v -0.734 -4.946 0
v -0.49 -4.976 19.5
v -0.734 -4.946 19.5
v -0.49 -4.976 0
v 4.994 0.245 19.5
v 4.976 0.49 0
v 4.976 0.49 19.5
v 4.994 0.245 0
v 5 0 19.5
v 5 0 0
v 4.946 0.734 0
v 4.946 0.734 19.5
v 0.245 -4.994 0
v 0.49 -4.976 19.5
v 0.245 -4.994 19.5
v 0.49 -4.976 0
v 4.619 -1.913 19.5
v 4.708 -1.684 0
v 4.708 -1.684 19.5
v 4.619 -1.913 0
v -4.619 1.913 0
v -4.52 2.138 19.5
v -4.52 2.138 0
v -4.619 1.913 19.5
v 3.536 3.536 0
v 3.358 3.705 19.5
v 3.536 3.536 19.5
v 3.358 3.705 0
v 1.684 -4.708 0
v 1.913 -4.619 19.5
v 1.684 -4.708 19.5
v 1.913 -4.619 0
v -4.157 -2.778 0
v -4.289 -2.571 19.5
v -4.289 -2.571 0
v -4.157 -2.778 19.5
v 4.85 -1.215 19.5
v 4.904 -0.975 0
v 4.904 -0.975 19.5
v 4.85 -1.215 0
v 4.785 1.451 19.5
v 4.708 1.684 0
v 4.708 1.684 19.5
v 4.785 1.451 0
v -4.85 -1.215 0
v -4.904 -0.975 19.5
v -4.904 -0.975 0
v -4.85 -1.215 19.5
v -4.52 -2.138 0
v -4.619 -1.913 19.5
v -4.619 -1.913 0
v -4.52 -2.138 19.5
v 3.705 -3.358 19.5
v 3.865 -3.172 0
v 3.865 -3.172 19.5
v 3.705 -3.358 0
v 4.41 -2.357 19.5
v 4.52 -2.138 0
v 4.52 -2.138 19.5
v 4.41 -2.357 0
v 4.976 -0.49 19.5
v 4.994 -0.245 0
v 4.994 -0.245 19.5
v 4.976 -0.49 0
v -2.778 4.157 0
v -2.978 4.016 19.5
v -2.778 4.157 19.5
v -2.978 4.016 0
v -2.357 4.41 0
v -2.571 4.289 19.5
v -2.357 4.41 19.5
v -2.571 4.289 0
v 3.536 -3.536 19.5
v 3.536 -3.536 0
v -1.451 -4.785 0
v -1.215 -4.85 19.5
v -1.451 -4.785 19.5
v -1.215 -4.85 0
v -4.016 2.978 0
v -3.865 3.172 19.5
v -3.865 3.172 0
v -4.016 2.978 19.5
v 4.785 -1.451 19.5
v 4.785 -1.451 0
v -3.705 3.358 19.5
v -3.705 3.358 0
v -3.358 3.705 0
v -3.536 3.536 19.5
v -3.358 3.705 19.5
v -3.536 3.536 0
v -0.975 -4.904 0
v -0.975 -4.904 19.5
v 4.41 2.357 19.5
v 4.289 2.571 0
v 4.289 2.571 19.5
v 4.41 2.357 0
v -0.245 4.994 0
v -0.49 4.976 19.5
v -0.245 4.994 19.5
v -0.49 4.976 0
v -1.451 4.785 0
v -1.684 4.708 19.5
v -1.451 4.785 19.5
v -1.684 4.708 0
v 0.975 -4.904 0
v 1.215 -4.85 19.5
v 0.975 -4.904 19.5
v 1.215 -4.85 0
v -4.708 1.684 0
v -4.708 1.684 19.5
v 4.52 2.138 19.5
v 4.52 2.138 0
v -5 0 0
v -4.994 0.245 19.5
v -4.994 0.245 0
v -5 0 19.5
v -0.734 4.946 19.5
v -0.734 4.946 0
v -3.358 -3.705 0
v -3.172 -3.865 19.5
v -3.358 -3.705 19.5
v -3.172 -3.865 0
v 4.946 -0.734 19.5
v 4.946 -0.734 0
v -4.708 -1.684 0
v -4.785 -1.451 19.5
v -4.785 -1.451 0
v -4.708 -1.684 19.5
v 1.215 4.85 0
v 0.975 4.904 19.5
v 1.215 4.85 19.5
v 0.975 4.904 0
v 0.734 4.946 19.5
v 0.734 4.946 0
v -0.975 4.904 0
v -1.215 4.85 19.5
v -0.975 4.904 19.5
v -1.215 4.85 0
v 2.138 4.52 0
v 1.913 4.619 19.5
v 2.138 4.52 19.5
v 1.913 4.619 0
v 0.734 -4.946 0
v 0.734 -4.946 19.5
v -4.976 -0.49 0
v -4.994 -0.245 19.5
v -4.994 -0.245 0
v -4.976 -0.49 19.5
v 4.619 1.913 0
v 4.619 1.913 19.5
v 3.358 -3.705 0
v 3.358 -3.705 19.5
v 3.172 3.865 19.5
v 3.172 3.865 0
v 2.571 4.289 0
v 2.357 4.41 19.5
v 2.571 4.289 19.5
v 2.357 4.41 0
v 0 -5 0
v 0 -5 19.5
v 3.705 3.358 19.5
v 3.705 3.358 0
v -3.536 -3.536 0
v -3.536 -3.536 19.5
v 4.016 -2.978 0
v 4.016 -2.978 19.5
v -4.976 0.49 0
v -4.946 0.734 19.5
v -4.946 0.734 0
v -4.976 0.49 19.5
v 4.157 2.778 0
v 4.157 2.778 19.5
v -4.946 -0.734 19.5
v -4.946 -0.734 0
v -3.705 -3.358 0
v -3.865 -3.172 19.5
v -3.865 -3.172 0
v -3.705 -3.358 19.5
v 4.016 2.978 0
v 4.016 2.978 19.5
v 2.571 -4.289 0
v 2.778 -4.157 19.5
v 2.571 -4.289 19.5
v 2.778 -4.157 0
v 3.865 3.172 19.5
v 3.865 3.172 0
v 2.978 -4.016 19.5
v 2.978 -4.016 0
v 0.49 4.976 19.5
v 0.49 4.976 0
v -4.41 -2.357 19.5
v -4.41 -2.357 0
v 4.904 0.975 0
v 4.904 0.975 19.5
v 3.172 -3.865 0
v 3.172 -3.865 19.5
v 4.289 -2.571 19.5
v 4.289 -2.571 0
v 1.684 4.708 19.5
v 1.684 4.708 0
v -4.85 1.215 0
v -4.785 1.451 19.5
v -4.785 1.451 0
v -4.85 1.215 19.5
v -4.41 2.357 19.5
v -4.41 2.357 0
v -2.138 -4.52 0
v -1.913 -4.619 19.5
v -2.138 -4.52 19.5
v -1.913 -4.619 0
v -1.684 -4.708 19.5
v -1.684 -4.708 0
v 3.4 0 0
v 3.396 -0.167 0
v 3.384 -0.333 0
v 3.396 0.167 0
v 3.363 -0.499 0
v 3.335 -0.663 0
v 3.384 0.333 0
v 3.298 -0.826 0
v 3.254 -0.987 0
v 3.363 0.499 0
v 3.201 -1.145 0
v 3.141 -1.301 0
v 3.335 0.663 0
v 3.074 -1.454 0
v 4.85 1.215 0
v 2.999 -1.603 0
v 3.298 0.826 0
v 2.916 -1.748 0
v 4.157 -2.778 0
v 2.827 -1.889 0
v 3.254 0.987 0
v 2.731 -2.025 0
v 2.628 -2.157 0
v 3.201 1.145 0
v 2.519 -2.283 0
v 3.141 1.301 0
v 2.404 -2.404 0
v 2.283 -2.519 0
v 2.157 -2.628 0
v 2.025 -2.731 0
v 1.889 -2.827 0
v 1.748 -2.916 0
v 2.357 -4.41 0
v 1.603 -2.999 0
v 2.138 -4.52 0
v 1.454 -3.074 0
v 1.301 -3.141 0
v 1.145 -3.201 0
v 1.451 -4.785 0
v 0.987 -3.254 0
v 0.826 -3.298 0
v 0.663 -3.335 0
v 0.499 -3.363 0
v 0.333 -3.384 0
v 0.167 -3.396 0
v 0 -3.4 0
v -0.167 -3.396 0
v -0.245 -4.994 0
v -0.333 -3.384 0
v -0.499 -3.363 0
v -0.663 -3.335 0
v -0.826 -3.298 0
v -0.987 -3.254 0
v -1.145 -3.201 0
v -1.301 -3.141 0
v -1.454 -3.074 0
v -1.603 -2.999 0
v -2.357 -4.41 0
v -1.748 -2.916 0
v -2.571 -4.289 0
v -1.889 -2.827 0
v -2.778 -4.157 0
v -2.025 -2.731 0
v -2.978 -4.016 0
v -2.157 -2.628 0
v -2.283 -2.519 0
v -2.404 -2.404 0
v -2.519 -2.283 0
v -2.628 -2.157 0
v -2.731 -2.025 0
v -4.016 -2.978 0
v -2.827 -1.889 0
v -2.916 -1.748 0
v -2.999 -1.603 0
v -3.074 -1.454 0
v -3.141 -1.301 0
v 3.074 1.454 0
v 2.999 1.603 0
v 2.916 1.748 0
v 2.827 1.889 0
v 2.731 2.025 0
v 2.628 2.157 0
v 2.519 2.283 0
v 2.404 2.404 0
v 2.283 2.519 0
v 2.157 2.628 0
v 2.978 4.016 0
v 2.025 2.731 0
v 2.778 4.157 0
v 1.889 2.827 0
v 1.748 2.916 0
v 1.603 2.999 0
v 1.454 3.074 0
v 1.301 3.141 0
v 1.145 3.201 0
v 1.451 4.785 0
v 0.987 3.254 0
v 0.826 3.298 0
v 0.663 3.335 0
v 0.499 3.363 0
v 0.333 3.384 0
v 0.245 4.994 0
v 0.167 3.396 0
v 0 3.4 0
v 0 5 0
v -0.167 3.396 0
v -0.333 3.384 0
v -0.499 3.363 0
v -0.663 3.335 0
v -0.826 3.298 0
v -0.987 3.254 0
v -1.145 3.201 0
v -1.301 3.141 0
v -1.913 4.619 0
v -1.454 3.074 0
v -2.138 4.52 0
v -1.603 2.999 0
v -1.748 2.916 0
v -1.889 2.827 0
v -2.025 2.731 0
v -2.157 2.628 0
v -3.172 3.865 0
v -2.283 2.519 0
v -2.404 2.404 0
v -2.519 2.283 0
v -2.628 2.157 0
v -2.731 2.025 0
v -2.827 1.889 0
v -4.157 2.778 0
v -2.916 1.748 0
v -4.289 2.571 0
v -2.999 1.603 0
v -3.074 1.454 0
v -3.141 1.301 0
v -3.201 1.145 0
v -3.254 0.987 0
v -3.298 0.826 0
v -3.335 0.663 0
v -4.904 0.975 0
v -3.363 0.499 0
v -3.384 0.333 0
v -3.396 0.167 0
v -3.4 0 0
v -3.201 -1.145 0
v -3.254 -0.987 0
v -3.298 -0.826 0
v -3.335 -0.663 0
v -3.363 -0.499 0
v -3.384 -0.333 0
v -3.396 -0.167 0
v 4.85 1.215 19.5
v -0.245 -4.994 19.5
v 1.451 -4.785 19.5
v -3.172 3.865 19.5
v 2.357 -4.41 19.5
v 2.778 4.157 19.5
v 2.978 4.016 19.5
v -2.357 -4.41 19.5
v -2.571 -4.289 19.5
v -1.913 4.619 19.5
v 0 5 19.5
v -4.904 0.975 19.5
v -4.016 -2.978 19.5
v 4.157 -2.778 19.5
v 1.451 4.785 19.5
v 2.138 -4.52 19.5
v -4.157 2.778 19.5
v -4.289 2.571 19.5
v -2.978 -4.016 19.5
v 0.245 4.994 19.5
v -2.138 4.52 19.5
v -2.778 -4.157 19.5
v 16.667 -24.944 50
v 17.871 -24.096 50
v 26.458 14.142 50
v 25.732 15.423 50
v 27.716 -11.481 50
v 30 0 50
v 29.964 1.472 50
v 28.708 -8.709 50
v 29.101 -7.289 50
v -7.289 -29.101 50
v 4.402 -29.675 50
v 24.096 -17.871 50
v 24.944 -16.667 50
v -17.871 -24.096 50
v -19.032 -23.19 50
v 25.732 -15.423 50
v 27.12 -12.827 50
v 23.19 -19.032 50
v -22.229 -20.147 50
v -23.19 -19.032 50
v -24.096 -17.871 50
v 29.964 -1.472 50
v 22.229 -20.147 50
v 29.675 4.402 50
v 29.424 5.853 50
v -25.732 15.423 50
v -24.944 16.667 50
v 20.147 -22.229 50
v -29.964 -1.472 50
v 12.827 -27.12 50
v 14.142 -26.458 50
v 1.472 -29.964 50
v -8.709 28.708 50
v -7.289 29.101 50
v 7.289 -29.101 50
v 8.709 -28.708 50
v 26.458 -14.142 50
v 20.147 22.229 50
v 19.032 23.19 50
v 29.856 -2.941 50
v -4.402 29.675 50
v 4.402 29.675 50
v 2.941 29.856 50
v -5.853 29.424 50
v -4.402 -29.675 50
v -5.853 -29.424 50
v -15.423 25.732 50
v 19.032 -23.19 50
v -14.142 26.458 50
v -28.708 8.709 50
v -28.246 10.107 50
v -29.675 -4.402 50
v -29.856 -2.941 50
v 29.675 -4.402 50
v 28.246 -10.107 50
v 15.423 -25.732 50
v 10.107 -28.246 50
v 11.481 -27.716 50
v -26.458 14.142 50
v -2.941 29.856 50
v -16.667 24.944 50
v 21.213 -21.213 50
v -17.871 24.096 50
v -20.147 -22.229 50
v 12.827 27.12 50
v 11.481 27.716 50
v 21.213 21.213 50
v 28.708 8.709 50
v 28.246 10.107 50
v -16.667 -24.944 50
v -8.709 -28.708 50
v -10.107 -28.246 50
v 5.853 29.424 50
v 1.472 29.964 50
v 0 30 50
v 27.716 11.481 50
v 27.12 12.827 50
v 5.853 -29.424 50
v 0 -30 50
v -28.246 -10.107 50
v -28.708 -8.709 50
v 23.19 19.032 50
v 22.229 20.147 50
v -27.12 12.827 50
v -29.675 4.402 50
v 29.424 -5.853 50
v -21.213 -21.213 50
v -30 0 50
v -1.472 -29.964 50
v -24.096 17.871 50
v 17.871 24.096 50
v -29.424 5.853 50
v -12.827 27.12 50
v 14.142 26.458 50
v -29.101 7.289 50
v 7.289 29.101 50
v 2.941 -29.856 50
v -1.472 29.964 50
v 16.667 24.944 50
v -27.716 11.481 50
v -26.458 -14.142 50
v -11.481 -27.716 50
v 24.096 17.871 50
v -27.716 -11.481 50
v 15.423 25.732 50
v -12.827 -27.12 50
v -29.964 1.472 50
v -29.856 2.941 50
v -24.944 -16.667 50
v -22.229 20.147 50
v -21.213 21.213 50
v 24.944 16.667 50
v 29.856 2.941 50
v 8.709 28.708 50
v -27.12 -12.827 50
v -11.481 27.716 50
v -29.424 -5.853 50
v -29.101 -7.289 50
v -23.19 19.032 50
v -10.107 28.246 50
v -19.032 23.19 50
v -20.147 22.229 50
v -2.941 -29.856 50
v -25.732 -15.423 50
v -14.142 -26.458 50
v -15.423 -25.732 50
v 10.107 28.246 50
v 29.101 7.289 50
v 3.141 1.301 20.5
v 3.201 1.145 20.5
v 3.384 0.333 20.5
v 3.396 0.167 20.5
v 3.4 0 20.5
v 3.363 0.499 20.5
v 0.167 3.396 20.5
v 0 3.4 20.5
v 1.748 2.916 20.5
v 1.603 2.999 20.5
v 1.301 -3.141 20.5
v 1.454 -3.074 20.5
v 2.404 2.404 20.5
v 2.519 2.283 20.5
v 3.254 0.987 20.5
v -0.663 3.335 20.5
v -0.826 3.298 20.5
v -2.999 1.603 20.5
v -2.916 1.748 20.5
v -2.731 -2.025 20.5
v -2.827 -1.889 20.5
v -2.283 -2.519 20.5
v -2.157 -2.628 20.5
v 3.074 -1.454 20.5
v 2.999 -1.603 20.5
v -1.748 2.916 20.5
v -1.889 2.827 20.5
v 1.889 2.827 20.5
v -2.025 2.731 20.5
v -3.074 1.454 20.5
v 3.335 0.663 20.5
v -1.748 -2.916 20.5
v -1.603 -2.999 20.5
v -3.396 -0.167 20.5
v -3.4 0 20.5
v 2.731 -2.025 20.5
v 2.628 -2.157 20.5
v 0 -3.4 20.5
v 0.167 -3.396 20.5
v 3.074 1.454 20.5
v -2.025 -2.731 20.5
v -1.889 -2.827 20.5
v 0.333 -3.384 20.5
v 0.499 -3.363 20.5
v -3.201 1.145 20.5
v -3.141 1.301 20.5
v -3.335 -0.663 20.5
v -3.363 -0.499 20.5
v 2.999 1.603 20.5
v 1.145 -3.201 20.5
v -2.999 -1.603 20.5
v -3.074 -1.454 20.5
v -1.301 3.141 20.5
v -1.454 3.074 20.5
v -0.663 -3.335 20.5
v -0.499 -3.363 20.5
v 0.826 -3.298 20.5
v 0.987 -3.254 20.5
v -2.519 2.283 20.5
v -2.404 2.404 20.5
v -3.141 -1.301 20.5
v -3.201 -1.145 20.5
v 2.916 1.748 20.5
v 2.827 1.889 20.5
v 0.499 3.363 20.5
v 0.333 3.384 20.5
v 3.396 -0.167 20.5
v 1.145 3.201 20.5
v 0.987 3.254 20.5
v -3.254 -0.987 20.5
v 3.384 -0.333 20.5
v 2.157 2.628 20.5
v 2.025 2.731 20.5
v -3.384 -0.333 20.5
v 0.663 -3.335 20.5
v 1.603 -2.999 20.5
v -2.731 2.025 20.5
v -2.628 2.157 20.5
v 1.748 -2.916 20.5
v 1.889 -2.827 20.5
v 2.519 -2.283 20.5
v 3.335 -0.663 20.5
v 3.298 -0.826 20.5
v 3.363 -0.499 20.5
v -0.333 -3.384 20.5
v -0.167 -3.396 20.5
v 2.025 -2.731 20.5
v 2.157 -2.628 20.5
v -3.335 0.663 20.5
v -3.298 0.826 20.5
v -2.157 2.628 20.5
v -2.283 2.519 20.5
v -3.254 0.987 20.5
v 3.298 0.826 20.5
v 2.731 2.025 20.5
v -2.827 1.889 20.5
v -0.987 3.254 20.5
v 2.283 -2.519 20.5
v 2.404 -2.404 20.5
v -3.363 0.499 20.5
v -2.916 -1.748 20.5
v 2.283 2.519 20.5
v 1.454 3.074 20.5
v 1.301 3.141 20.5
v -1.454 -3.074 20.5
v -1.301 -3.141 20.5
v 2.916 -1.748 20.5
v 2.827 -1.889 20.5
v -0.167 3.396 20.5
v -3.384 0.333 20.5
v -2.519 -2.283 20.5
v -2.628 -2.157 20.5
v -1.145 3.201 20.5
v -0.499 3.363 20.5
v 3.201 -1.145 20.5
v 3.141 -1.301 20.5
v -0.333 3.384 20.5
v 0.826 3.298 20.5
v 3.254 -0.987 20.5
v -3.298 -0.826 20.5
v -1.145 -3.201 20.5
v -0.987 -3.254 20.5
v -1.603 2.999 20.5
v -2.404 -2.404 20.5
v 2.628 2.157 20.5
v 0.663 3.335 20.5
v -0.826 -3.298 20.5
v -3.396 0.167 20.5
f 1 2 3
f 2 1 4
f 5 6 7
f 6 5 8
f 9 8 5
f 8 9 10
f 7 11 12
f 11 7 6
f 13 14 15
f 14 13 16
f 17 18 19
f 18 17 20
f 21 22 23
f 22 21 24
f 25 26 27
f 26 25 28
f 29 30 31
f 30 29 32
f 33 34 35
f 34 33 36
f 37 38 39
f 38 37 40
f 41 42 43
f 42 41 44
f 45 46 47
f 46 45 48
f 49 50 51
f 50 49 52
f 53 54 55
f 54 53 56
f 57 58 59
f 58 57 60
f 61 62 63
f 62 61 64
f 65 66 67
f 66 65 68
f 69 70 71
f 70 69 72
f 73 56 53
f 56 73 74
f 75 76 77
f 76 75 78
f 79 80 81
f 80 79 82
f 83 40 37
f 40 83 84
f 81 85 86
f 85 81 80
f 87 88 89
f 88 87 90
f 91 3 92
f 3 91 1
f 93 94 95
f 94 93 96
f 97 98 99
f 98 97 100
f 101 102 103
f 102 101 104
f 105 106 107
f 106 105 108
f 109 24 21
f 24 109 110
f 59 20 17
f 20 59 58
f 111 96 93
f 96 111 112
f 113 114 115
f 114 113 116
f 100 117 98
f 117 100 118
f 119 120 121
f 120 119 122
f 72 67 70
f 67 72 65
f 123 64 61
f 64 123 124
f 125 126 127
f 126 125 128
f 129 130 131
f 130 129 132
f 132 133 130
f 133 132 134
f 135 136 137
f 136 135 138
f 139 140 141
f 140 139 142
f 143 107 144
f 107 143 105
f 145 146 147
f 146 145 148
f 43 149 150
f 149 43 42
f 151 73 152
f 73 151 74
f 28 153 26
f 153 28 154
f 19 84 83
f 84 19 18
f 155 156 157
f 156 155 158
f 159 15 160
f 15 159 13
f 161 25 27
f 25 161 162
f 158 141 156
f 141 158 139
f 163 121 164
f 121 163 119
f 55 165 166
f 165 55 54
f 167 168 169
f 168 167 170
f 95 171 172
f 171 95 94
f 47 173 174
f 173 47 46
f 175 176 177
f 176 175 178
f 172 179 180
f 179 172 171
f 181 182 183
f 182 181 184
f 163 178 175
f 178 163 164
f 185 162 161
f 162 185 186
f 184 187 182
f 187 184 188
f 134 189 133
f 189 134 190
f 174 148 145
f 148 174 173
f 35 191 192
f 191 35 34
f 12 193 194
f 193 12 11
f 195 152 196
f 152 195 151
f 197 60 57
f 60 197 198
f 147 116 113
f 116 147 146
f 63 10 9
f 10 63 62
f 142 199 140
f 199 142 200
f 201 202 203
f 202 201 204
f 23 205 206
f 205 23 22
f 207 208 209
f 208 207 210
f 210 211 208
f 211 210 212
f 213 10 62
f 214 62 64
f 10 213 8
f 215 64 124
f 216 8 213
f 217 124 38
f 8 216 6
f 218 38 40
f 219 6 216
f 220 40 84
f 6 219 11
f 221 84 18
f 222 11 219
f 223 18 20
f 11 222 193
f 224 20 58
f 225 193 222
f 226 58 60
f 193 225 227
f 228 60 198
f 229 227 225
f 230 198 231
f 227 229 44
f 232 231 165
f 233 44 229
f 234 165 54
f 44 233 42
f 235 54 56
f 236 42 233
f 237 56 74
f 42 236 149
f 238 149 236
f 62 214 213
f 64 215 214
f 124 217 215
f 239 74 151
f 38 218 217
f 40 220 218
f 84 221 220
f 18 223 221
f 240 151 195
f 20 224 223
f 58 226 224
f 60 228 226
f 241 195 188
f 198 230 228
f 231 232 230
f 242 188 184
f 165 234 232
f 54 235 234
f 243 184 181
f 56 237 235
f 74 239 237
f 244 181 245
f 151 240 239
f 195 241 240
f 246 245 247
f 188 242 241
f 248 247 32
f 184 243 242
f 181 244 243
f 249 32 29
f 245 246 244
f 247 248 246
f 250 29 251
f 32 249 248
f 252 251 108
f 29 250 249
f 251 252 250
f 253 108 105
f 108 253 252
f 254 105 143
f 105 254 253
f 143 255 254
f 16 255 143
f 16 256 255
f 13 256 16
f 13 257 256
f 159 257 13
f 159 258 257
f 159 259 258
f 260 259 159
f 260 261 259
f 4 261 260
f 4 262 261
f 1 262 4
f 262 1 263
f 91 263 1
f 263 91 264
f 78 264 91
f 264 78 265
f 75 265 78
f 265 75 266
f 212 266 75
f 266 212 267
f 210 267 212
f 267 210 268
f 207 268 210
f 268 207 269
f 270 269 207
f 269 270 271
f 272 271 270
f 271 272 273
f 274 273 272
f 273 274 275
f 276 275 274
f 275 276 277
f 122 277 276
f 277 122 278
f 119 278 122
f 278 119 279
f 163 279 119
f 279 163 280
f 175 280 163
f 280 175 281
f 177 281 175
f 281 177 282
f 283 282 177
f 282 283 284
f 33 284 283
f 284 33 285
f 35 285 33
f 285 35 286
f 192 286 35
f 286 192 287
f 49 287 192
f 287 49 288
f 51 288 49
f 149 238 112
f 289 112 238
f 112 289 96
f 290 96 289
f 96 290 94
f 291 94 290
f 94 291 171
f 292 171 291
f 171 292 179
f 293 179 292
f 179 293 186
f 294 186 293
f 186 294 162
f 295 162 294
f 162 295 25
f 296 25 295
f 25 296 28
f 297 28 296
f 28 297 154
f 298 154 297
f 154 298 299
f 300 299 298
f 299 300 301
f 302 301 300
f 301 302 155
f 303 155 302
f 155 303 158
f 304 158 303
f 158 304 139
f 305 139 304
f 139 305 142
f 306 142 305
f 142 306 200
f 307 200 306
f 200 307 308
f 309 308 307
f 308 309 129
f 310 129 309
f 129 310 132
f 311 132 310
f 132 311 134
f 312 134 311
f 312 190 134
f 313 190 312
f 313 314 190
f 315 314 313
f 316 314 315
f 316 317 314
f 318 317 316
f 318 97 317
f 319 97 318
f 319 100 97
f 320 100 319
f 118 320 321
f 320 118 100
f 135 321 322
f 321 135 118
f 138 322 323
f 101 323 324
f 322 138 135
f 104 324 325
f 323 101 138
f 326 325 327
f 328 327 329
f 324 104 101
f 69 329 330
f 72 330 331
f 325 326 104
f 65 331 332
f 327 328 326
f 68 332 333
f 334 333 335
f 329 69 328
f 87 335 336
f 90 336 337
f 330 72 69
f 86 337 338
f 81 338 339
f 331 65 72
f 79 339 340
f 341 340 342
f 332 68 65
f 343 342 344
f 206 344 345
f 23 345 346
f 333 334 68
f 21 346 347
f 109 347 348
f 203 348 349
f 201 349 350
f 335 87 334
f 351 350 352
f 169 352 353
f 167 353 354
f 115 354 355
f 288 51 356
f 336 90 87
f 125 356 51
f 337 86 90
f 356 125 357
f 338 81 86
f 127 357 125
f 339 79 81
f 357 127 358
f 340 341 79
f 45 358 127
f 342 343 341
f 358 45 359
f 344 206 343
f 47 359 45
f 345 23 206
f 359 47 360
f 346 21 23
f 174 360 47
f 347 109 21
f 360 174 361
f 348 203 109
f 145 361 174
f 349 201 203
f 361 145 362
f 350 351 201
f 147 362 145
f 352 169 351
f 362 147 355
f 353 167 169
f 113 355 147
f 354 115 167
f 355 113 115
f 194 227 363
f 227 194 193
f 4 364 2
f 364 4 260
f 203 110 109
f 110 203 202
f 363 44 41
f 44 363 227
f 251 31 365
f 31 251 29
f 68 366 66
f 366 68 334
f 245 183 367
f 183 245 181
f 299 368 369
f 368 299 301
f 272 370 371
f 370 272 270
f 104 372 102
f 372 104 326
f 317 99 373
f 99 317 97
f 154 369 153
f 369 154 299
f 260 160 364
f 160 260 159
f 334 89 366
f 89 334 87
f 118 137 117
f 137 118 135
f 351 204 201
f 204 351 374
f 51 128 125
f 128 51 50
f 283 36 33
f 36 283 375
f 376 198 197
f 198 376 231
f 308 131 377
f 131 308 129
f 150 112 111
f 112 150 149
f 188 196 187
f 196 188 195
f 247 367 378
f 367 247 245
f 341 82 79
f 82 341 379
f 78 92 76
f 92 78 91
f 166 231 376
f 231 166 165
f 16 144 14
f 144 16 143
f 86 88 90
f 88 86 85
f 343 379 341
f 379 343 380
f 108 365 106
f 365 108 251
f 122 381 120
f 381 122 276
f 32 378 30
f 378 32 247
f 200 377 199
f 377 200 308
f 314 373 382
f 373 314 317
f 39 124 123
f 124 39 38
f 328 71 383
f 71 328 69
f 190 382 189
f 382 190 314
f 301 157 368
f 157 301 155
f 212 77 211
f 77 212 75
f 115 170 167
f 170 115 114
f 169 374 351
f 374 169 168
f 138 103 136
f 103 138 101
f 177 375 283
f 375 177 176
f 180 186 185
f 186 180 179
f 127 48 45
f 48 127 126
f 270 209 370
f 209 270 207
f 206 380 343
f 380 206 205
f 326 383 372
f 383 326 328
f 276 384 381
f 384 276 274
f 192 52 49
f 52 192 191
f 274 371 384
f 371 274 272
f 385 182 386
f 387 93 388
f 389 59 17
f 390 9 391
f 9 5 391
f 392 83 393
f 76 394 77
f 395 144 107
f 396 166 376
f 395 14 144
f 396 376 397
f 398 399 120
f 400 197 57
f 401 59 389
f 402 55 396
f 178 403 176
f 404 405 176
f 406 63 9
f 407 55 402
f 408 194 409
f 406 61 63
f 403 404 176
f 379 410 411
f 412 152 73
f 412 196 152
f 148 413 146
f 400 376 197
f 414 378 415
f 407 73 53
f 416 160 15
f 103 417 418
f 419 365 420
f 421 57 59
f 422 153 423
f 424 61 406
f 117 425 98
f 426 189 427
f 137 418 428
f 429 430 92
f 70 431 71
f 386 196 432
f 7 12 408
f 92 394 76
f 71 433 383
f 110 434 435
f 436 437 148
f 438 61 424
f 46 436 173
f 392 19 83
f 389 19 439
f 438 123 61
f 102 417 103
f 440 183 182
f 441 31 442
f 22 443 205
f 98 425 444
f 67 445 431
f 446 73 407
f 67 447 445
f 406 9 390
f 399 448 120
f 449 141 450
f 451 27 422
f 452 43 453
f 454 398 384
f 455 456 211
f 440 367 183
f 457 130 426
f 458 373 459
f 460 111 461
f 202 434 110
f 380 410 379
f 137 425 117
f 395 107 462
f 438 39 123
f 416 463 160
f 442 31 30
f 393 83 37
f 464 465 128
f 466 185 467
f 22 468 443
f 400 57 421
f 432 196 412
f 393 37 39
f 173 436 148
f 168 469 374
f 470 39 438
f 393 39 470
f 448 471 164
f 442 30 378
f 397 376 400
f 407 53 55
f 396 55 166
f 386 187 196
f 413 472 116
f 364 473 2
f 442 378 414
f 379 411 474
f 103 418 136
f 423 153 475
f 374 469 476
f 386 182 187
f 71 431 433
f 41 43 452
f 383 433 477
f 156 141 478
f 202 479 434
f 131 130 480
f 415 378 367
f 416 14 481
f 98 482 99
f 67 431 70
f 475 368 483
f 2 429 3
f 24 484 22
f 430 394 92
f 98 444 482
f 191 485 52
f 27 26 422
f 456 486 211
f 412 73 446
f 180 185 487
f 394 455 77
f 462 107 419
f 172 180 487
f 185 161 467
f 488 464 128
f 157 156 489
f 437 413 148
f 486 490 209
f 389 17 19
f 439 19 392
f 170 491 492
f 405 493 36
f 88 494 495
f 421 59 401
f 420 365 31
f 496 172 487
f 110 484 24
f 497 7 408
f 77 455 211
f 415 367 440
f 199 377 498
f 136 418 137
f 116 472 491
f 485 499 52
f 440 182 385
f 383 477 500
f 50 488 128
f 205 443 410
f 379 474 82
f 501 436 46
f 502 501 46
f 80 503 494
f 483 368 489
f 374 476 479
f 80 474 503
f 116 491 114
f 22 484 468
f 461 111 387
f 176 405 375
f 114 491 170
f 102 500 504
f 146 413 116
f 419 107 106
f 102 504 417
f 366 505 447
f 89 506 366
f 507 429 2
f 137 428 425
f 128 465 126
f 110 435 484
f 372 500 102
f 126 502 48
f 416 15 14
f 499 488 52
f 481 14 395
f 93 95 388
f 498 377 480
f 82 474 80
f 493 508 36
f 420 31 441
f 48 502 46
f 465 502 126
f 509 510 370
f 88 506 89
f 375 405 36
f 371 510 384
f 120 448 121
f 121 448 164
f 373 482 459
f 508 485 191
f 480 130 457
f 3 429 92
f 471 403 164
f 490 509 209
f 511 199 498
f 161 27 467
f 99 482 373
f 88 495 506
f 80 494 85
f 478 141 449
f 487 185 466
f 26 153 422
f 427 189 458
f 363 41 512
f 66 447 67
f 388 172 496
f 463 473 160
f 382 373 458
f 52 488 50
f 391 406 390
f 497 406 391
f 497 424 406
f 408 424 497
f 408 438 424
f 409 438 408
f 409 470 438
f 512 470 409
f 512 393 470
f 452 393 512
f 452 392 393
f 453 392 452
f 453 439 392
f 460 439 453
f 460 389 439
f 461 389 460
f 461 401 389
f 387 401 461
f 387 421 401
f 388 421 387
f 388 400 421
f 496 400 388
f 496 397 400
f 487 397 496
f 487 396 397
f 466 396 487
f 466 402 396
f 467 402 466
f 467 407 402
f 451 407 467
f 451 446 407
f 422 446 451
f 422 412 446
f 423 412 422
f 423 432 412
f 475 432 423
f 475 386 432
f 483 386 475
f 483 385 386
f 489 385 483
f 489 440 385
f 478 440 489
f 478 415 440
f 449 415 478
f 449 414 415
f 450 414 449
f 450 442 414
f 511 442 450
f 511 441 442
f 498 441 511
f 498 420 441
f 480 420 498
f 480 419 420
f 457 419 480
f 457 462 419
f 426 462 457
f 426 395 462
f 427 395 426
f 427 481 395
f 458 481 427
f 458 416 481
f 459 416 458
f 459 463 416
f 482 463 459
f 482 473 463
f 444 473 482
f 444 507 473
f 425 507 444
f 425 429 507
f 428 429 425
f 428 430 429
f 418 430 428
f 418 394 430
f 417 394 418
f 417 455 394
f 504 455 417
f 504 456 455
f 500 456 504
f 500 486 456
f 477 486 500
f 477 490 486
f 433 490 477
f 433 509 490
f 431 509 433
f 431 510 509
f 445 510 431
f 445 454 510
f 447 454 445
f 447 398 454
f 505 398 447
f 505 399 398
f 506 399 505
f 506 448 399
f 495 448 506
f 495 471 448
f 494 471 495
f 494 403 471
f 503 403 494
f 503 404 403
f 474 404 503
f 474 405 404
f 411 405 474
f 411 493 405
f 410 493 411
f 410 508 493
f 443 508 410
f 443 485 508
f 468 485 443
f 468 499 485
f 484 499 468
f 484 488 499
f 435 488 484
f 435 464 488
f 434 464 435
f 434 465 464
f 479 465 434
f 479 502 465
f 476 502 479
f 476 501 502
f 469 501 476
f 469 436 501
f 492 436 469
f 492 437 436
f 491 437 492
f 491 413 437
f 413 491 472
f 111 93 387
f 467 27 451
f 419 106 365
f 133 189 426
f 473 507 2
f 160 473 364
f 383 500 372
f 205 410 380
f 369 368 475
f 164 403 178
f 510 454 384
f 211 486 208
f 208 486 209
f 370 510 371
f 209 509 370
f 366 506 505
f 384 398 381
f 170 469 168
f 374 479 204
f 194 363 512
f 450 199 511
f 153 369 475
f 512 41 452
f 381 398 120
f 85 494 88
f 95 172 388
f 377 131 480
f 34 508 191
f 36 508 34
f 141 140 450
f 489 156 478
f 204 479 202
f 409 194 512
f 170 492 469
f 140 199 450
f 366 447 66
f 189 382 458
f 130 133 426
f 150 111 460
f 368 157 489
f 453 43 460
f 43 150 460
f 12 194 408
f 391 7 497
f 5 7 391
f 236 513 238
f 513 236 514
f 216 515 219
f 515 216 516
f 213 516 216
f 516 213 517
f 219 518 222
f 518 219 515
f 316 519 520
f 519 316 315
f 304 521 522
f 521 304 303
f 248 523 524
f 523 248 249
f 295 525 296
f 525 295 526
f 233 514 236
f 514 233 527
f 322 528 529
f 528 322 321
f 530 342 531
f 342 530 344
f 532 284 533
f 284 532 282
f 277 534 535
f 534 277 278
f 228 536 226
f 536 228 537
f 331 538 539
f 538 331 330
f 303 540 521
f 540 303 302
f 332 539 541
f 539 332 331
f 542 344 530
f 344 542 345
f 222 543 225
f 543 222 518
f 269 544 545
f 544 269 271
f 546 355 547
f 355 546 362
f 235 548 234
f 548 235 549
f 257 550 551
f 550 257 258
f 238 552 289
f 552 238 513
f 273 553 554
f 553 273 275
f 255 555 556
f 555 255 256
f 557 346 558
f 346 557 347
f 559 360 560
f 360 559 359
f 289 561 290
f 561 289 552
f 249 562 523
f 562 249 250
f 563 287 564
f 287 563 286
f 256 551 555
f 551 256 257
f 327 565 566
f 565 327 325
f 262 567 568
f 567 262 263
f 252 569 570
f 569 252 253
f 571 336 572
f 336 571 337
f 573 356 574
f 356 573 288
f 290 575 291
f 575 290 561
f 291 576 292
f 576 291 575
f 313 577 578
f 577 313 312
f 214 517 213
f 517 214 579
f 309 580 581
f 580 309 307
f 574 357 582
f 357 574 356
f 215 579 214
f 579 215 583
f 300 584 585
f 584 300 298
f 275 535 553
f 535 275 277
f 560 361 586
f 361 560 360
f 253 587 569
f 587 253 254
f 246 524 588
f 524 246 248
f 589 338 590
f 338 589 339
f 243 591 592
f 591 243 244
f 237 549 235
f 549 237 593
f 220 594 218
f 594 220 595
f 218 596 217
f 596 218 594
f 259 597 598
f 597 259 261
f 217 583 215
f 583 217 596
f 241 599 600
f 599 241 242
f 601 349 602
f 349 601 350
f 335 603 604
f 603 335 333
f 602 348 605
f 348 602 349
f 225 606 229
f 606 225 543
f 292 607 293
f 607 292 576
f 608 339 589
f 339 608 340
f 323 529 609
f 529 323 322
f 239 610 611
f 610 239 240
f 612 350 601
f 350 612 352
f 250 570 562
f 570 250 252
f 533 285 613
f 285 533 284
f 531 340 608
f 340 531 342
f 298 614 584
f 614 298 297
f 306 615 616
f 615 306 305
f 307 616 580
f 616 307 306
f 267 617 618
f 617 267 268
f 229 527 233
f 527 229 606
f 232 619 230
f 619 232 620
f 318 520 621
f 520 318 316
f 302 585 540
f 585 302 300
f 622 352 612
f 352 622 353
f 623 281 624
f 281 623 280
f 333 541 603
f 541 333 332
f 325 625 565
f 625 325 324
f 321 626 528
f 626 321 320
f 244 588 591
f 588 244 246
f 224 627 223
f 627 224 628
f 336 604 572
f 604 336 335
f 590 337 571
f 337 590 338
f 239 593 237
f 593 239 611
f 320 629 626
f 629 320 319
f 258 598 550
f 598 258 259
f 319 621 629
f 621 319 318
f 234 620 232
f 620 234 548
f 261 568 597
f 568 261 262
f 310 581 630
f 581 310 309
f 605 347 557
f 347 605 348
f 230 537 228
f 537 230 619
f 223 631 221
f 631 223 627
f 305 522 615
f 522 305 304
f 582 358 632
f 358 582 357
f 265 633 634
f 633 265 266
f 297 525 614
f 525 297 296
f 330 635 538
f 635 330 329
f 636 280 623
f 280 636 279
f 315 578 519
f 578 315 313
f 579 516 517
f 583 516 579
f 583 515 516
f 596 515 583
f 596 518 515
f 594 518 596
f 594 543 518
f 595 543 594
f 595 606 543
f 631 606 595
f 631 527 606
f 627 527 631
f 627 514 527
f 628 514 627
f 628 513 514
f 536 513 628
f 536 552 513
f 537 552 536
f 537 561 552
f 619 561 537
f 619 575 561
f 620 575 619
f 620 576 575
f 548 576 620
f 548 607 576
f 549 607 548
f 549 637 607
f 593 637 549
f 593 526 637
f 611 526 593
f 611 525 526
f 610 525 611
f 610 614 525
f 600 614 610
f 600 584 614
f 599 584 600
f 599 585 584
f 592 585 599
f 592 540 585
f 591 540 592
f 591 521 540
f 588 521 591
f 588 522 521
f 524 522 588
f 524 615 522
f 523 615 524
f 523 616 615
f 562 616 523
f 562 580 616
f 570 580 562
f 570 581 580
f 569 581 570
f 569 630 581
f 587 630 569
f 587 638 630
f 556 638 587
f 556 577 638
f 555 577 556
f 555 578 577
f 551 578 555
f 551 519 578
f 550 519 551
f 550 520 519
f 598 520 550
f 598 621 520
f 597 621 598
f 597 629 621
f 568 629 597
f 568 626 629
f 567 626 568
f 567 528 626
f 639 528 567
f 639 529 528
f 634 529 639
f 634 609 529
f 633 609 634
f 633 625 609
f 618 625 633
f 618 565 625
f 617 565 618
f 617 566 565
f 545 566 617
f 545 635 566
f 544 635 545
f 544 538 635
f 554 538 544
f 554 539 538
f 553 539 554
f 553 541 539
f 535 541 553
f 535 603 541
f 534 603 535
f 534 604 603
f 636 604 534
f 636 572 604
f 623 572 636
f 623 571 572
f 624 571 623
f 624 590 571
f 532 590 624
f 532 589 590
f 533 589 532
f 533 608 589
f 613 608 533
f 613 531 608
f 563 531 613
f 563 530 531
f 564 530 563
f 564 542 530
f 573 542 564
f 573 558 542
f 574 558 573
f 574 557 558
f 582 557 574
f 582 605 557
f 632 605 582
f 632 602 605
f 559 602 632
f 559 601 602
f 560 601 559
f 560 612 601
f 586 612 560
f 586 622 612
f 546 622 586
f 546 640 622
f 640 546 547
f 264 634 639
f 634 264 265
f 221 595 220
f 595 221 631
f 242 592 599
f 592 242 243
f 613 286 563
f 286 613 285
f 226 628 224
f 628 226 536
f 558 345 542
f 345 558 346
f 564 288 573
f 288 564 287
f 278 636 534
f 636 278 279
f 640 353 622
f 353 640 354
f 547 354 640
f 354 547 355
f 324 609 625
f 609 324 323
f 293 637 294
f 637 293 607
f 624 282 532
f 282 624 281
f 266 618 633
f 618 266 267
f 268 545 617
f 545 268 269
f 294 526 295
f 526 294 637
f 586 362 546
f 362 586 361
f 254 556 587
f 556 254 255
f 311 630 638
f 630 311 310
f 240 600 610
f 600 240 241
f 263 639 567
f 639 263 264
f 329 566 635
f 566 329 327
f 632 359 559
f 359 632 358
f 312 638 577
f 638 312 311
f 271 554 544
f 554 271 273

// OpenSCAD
// Lab funnel - printed upright with wide opening at the top
// Units: mm

// ---- Parameters ----
spout_od        = 10;    // spout outer diameter
spout_h         = 20;    // spout height (z = 0 to 20)
cone_od_top     = 60;    // cone outer diameter at rim
cone_h          = 30;    // cone height (z = 20 to 50)
wall            = 1.6;   // wall thickness everywhere
eps             = 0.5;   // overlap for clean boolean cuts
$fn             = 128;   // curve resolution

// Derived
spout_id = spout_od - 2 * wall;   // 6.8 mm bore
cone_od_bottom = spout_od;       // cone starts at spout diameter

// ---- Model ----
difference() {
    union() {
        // Spout
        cylinder(d = spout_od, h = spout_h);

        // Cone (expanded from bottom diameter at z = spout_h)
        translate([0, 0, spout_h - eps])
            cylinder(d1 = cone_od_bottom, d2 = cone_od_top, h = cone_h + eps);
    }

    // Bottom cut (open bottom)
    translate([0, 0, -eps])
        cylinder(d = spout_id, h = spout_h + 2 * eps);
}
